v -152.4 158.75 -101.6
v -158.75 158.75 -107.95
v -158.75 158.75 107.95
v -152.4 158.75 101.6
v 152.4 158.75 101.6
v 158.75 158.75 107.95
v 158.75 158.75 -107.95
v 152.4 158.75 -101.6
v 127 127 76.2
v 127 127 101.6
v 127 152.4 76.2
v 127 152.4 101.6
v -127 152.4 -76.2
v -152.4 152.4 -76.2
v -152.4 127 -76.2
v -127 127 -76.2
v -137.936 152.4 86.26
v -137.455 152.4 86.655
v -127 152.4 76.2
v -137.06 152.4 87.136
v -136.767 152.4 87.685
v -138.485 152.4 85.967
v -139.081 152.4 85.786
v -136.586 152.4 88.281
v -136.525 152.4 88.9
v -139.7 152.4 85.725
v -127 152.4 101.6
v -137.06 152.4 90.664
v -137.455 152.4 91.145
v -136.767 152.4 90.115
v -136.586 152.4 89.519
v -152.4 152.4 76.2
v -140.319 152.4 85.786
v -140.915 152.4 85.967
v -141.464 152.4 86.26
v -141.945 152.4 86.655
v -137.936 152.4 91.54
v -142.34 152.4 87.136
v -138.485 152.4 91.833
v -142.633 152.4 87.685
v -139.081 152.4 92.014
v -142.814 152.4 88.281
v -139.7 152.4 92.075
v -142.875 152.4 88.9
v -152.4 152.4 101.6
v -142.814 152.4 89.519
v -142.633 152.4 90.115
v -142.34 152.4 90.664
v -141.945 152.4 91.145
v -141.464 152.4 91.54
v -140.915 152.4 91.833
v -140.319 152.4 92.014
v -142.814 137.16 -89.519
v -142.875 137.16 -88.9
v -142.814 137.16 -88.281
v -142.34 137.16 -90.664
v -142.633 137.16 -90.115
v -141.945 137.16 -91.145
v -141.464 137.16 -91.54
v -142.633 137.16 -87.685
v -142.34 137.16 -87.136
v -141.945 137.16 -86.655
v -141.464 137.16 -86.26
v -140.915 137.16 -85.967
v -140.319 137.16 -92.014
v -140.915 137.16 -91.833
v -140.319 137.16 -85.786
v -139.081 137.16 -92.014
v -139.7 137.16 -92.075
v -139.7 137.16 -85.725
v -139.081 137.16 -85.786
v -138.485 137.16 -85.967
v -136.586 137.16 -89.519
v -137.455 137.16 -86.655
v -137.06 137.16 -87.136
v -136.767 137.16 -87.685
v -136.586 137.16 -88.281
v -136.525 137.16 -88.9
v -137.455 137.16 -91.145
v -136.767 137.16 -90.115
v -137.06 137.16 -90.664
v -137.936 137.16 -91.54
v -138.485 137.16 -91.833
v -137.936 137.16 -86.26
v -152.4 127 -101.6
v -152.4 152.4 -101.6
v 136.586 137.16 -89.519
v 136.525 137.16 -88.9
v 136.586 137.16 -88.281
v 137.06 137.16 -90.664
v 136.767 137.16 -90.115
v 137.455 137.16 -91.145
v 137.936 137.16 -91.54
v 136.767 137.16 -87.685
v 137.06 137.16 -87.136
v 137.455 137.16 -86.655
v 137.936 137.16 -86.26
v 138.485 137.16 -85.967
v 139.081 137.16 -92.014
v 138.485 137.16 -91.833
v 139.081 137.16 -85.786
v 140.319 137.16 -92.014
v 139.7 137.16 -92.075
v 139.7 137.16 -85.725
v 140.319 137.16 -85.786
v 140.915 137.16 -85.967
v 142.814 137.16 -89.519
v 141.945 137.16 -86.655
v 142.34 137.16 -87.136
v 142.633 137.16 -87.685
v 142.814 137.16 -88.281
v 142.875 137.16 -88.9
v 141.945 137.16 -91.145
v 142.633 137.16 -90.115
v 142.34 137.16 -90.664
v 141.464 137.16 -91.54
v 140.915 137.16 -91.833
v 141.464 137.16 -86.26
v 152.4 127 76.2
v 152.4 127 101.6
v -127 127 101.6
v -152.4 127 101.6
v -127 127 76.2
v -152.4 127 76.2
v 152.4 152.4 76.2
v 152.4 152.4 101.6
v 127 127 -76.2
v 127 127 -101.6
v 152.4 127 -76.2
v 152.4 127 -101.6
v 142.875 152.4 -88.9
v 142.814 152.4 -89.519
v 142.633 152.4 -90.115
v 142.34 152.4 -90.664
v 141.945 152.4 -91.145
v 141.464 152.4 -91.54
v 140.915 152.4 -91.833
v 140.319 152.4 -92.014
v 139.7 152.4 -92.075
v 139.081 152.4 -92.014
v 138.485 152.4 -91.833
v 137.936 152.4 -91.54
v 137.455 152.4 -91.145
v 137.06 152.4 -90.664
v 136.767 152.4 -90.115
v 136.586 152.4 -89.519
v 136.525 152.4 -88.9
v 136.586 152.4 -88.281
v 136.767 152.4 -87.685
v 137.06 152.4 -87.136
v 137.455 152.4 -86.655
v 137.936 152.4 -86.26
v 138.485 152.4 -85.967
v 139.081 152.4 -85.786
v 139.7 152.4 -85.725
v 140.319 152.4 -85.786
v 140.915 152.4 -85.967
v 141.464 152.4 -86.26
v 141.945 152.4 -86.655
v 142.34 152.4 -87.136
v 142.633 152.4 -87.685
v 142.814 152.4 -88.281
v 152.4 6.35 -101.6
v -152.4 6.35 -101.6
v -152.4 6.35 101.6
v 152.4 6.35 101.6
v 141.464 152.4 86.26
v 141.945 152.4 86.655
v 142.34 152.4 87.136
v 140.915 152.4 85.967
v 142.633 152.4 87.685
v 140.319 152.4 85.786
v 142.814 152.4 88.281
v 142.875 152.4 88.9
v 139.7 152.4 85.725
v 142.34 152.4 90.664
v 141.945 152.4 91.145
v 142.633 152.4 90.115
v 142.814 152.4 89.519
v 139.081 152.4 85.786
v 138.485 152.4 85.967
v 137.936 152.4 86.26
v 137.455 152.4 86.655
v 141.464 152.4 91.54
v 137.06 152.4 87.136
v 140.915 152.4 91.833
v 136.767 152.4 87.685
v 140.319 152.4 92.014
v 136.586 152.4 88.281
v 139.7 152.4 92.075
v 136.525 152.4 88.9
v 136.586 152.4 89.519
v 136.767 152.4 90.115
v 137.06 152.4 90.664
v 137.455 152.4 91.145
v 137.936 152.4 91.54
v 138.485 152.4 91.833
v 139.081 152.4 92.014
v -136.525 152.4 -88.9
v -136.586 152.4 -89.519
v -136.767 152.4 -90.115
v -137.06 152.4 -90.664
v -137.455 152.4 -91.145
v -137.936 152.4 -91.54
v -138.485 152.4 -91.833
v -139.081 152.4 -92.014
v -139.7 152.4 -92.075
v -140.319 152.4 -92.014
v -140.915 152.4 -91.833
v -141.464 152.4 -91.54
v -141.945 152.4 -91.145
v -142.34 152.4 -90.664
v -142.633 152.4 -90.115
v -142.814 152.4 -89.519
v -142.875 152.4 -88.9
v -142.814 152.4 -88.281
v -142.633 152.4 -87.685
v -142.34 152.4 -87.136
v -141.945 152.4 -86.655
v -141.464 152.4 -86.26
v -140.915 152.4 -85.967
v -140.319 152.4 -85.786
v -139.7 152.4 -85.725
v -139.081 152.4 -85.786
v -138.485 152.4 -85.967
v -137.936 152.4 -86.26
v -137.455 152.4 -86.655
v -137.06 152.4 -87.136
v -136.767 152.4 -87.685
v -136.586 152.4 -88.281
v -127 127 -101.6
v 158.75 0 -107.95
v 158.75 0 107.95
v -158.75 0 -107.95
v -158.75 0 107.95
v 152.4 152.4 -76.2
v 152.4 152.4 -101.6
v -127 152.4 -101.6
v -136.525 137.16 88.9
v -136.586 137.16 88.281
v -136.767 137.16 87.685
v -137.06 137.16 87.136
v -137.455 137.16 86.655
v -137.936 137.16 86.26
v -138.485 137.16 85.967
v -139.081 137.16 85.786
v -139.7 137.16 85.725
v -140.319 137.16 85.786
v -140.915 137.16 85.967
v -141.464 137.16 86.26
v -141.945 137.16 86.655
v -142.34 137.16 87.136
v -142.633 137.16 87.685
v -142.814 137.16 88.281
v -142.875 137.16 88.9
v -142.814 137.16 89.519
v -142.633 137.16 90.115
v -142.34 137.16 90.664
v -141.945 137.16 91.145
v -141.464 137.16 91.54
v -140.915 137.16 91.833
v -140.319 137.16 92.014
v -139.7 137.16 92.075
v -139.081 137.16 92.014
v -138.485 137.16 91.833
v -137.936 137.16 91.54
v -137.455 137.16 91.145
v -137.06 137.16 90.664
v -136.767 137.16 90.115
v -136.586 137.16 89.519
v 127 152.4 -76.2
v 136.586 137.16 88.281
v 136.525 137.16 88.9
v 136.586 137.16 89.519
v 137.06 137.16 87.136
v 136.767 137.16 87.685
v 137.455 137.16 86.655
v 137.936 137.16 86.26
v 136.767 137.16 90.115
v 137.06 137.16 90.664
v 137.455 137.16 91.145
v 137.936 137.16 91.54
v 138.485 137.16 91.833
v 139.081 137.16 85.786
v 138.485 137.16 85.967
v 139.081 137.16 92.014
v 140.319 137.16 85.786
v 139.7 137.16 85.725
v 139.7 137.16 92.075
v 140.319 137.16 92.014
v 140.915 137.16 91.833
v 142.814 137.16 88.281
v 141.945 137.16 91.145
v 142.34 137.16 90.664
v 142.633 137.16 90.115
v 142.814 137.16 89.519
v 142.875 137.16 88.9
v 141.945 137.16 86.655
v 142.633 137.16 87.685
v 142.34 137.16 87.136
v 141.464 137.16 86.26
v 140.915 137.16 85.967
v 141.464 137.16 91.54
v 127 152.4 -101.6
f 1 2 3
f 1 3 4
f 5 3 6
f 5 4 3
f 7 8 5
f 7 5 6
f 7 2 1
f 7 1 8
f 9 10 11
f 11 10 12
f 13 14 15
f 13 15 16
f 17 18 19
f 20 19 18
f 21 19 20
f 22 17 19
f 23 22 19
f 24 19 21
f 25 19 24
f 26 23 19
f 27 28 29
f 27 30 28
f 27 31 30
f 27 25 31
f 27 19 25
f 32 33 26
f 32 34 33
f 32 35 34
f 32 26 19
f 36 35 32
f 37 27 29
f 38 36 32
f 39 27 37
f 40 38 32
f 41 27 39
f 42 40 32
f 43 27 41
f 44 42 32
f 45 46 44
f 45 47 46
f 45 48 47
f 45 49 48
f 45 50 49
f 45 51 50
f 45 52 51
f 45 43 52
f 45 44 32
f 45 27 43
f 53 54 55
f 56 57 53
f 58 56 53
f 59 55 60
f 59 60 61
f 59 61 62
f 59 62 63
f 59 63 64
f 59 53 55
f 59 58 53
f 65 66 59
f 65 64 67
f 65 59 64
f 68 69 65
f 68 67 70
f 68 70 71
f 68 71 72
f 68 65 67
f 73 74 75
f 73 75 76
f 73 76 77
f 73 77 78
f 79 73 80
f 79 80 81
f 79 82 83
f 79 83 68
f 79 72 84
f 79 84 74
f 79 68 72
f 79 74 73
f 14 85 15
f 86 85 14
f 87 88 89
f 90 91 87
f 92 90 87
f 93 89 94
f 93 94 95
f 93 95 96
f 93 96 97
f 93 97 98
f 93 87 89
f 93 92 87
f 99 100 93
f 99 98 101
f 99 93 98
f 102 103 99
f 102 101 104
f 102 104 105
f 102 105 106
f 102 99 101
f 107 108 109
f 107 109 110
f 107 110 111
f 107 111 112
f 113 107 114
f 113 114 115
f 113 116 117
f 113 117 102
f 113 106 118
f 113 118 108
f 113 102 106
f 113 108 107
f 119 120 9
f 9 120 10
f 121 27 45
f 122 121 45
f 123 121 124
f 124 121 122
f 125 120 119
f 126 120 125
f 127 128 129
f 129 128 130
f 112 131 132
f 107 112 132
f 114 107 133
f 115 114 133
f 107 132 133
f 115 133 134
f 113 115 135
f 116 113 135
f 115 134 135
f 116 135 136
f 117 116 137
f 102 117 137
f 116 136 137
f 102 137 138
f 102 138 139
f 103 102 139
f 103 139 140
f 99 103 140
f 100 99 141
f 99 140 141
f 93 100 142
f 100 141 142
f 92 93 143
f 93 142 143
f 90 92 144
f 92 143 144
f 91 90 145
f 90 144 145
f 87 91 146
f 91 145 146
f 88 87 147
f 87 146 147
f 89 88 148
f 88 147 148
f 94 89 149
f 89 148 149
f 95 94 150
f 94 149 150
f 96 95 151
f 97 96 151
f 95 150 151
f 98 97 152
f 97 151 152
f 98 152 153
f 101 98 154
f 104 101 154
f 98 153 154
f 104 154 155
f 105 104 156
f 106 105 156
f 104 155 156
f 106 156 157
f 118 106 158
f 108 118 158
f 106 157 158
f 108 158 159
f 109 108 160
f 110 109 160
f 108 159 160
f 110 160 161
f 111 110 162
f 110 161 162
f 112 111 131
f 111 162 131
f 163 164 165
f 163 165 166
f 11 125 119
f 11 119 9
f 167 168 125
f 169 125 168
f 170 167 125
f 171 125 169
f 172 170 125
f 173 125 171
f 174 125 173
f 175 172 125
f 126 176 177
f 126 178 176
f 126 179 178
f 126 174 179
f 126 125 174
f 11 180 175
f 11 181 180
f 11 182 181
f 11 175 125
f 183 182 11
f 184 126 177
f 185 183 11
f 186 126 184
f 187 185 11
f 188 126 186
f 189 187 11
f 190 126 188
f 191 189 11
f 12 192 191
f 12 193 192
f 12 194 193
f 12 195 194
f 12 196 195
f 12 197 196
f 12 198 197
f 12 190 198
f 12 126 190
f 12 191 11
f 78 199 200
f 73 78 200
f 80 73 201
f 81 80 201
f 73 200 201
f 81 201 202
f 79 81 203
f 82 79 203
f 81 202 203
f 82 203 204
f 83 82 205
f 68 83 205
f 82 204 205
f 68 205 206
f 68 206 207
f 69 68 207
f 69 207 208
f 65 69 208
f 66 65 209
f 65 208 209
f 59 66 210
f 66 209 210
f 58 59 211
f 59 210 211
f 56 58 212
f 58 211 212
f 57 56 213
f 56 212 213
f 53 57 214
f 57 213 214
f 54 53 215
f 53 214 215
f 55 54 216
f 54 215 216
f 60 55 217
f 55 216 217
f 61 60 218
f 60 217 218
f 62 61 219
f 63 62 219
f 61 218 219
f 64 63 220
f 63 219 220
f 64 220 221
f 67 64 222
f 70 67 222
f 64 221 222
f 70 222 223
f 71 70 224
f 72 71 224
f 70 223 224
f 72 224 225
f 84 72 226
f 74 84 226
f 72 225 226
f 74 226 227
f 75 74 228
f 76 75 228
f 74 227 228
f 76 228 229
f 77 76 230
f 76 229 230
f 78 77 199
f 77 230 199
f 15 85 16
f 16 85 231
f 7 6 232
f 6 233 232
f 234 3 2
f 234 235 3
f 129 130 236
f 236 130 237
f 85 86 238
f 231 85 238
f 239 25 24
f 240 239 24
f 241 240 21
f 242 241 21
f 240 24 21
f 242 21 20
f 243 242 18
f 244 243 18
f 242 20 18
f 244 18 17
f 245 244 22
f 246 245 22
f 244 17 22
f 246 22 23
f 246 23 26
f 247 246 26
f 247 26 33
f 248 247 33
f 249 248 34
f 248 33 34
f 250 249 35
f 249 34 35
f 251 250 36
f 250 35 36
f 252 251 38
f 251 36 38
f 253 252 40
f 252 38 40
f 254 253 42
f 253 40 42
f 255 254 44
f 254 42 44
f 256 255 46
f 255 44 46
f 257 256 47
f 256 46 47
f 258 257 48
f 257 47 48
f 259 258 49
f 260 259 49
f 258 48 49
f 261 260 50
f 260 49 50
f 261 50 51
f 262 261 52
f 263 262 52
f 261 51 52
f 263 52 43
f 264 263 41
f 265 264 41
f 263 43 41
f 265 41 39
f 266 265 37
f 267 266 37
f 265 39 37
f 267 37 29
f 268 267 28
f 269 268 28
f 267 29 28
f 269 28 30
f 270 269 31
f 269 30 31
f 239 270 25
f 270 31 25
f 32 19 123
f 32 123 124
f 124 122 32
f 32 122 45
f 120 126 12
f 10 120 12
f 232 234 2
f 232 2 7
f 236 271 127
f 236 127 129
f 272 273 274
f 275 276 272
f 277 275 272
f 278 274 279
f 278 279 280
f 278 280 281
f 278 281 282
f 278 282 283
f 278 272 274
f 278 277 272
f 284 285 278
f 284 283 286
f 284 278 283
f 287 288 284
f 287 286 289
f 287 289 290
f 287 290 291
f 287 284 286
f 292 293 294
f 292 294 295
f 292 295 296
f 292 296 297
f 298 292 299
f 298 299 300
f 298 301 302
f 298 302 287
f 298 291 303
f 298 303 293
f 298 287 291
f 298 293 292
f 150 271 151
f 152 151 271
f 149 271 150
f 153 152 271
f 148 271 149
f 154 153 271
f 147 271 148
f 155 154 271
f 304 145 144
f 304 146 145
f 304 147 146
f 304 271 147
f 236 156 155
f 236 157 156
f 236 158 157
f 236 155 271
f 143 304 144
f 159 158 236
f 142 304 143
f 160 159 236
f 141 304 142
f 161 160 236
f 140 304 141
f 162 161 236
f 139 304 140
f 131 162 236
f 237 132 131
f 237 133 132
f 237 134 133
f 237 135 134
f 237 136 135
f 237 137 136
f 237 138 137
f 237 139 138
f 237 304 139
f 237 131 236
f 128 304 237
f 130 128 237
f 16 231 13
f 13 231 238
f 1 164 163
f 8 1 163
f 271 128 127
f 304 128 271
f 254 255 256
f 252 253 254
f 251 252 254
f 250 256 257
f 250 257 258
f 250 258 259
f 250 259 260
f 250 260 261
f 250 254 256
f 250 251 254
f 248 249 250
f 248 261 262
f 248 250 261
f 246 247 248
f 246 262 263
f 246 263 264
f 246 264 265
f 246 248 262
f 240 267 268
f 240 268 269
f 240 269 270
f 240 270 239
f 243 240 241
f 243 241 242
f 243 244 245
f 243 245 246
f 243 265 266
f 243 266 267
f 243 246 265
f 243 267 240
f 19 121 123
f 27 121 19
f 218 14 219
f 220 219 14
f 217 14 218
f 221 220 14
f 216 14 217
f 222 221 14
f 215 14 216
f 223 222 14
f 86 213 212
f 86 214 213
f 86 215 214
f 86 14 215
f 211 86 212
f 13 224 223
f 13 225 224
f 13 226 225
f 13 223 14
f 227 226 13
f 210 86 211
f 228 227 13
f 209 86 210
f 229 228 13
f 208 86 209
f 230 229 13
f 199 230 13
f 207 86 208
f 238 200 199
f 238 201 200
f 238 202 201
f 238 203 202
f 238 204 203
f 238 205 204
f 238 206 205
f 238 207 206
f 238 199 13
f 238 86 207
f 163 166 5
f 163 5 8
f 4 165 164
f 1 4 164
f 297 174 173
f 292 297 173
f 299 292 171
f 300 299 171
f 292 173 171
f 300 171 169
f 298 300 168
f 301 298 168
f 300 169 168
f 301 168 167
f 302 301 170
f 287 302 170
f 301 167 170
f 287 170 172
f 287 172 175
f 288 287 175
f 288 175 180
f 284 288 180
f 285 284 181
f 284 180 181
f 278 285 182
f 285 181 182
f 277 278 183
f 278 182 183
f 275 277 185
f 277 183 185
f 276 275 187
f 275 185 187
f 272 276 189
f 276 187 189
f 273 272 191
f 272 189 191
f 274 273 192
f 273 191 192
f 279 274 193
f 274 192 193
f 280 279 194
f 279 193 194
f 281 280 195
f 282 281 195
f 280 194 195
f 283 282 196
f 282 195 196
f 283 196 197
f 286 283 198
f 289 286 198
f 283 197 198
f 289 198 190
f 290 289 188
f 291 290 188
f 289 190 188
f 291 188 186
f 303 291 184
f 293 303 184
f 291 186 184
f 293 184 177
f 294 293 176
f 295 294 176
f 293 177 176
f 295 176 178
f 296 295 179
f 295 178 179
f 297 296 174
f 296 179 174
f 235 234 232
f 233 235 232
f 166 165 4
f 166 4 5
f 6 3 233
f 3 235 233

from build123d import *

# Parameters (mm, degrees)
SKETCH1_W             = 317.5
SKETCH1_H             = 215.9
BOSS_EXTRUDE1_DEPTH   = 6.35
SKETCH2_W             = 317.5
SKETCH2_H             = 215.9
SKETCH2_W_2           = 304.8
SKETCH2_H_2           = 203.2
BOSS_EXTRUDE2_DEPTH   = 152.4
SKETCH3_W             = 25.4
SKETCH3_H             = 25.4
BOSS_EXTRUDE3_DEPTH   = 25.4
BOSS_EXTRUDE3_2_DEPTH = 25.4
SKETCH5_W             = 25.4
SKETCH5_H             = 25.4
BOSS_EXTRUDE5_DEPTH   = 25.4
BOSS_EXTRUDE5_2_DEPTH = 25.4
SKETCH6_R             = 3.175
CUT_EXTRUDE1_DEPTH    = 15.24


with BuildPart() as part:
    # Sketch1 → Boss-Extrude1 (new body)
    with BuildSketch(Plane(origin=(0, 0, 0), x_dir=(1, 0, 0), z_dir=(0, 1, 0))):
        Rectangle(SKETCH1_W, SKETCH1_H)
    extrude(amount=BOSS_EXTRUDE1_DEPTH)

    # Sketch2 → Boss-Extrude2 (add)
    with BuildSketch(Plane(origin=(0, 6.35, 0), x_dir=(1, 0, 0), z_dir=(0, 1, 0))):
        Rectangle(SKETCH2_W, SKETCH2_H)
        Rectangle(SKETCH2_W_2, SKETCH2_H_2, mode=Mode.SUBTRACT)
    extrude(amount=BOSS_EXTRUDE2_DEPTH)


with BuildPart() as body_2:
    # Sketch3 → Boss-Extrude3 (new body)
    with BuildSketch(Plane.XY.offset(-101.6)):
        with Locations((-139.7, 139.7)):
            Rectangle(SKETCH3_W, SKETCH3_H)
    extrude(amount=BOSS_EXTRUDE3_DEPTH)


with BuildPart() as body_3:
    # Sketch3 → Boss-Extrude3 2 (new body)
    with BuildSketch(Plane.XY.offset(-101.6)):
        with Locations((139.7, 139.7)):
            Rectangle(SKETCH3_W, SKETCH3_H)
    extrude(amount=BOSS_EXTRUDE3_2_DEPTH)


with BuildPart() as body_4:
    # Sketch5 → Boss-Extrude5 (new body)
    with BuildSketch(Plane(origin=(0, 0, 101.6), x_dir=(-1, 0, 0), z_dir=(0, 0, -1))):
        with Locations((-139.7, 139.7)):
            Rectangle(SKETCH5_W, SKETCH5_H)
    extrude(amount=BOSS_EXTRUDE5_DEPTH)


with BuildPart() as body_5:
    # Sketch5 → Boss-Extrude5 2 (new body)
    with BuildSketch(Plane(origin=(0, 0, 101.6), x_dir=(-1, 0, 0), z_dir=(0, 0, -1))):
        with Locations((139.7, 139.7)):
            Rectangle(SKETCH5_W, SKETCH5_H)
    extrude(amount=BOSS_EXTRUDE5_2_DEPTH)


with BuildPart() as cut_extrude1_tool:
    # Sketch6 → Cut-Extrude1 (new body)
    with BuildSketch(Plane(origin=(0, 152.4, 0), x_dir=(1, 0, 0), z_dir=(0, 1, 0))):
        with Locations((139.7, -88.9)):
            Circle(SKETCH6_R)
        with Locations((-139.7, -88.9)):
            Circle(SKETCH6_R)
        with Locations((-139.7, 88.9)):
            Circle(SKETCH6_R)
        with Locations((139.7, 88.9)):
            Circle(SKETCH6_R)
    extrude(amount=-CUT_EXTRUDE1_DEPTH)


with BuildPart() as body_2_1:
    add(body_2.part)

    # Cut-Extrude1: cut by cut_extrude1_tool
    add(cut_extrude1_tool.part, mode=Mode.SUBTRACT)


with BuildPart() as body_3_1:
    add(body_3.part)

    # Cut-Extrude1: cut by cut_extrude1_tool
    add(cut_extrude1_tool.part, mode=Mode.SUBTRACT)


with BuildPart() as body_4_1:
    add(body_4.part)

    # Cut-Extrude1: cut by cut_extrude1_tool
    add(cut_extrude1_tool.part, mode=Mode.SUBTRACT)


with BuildPart() as body_5_1:
    add(body_5.part)

    # Cut-Extrude1: cut by cut_extrude1_tool
    add(cut_extrude1_tool.part, mode=Mode.SUBTRACT)


solid = Compound([part.part, body_2_1.part, body_3_1.part, body_4_1.part, body_5_1.part])
